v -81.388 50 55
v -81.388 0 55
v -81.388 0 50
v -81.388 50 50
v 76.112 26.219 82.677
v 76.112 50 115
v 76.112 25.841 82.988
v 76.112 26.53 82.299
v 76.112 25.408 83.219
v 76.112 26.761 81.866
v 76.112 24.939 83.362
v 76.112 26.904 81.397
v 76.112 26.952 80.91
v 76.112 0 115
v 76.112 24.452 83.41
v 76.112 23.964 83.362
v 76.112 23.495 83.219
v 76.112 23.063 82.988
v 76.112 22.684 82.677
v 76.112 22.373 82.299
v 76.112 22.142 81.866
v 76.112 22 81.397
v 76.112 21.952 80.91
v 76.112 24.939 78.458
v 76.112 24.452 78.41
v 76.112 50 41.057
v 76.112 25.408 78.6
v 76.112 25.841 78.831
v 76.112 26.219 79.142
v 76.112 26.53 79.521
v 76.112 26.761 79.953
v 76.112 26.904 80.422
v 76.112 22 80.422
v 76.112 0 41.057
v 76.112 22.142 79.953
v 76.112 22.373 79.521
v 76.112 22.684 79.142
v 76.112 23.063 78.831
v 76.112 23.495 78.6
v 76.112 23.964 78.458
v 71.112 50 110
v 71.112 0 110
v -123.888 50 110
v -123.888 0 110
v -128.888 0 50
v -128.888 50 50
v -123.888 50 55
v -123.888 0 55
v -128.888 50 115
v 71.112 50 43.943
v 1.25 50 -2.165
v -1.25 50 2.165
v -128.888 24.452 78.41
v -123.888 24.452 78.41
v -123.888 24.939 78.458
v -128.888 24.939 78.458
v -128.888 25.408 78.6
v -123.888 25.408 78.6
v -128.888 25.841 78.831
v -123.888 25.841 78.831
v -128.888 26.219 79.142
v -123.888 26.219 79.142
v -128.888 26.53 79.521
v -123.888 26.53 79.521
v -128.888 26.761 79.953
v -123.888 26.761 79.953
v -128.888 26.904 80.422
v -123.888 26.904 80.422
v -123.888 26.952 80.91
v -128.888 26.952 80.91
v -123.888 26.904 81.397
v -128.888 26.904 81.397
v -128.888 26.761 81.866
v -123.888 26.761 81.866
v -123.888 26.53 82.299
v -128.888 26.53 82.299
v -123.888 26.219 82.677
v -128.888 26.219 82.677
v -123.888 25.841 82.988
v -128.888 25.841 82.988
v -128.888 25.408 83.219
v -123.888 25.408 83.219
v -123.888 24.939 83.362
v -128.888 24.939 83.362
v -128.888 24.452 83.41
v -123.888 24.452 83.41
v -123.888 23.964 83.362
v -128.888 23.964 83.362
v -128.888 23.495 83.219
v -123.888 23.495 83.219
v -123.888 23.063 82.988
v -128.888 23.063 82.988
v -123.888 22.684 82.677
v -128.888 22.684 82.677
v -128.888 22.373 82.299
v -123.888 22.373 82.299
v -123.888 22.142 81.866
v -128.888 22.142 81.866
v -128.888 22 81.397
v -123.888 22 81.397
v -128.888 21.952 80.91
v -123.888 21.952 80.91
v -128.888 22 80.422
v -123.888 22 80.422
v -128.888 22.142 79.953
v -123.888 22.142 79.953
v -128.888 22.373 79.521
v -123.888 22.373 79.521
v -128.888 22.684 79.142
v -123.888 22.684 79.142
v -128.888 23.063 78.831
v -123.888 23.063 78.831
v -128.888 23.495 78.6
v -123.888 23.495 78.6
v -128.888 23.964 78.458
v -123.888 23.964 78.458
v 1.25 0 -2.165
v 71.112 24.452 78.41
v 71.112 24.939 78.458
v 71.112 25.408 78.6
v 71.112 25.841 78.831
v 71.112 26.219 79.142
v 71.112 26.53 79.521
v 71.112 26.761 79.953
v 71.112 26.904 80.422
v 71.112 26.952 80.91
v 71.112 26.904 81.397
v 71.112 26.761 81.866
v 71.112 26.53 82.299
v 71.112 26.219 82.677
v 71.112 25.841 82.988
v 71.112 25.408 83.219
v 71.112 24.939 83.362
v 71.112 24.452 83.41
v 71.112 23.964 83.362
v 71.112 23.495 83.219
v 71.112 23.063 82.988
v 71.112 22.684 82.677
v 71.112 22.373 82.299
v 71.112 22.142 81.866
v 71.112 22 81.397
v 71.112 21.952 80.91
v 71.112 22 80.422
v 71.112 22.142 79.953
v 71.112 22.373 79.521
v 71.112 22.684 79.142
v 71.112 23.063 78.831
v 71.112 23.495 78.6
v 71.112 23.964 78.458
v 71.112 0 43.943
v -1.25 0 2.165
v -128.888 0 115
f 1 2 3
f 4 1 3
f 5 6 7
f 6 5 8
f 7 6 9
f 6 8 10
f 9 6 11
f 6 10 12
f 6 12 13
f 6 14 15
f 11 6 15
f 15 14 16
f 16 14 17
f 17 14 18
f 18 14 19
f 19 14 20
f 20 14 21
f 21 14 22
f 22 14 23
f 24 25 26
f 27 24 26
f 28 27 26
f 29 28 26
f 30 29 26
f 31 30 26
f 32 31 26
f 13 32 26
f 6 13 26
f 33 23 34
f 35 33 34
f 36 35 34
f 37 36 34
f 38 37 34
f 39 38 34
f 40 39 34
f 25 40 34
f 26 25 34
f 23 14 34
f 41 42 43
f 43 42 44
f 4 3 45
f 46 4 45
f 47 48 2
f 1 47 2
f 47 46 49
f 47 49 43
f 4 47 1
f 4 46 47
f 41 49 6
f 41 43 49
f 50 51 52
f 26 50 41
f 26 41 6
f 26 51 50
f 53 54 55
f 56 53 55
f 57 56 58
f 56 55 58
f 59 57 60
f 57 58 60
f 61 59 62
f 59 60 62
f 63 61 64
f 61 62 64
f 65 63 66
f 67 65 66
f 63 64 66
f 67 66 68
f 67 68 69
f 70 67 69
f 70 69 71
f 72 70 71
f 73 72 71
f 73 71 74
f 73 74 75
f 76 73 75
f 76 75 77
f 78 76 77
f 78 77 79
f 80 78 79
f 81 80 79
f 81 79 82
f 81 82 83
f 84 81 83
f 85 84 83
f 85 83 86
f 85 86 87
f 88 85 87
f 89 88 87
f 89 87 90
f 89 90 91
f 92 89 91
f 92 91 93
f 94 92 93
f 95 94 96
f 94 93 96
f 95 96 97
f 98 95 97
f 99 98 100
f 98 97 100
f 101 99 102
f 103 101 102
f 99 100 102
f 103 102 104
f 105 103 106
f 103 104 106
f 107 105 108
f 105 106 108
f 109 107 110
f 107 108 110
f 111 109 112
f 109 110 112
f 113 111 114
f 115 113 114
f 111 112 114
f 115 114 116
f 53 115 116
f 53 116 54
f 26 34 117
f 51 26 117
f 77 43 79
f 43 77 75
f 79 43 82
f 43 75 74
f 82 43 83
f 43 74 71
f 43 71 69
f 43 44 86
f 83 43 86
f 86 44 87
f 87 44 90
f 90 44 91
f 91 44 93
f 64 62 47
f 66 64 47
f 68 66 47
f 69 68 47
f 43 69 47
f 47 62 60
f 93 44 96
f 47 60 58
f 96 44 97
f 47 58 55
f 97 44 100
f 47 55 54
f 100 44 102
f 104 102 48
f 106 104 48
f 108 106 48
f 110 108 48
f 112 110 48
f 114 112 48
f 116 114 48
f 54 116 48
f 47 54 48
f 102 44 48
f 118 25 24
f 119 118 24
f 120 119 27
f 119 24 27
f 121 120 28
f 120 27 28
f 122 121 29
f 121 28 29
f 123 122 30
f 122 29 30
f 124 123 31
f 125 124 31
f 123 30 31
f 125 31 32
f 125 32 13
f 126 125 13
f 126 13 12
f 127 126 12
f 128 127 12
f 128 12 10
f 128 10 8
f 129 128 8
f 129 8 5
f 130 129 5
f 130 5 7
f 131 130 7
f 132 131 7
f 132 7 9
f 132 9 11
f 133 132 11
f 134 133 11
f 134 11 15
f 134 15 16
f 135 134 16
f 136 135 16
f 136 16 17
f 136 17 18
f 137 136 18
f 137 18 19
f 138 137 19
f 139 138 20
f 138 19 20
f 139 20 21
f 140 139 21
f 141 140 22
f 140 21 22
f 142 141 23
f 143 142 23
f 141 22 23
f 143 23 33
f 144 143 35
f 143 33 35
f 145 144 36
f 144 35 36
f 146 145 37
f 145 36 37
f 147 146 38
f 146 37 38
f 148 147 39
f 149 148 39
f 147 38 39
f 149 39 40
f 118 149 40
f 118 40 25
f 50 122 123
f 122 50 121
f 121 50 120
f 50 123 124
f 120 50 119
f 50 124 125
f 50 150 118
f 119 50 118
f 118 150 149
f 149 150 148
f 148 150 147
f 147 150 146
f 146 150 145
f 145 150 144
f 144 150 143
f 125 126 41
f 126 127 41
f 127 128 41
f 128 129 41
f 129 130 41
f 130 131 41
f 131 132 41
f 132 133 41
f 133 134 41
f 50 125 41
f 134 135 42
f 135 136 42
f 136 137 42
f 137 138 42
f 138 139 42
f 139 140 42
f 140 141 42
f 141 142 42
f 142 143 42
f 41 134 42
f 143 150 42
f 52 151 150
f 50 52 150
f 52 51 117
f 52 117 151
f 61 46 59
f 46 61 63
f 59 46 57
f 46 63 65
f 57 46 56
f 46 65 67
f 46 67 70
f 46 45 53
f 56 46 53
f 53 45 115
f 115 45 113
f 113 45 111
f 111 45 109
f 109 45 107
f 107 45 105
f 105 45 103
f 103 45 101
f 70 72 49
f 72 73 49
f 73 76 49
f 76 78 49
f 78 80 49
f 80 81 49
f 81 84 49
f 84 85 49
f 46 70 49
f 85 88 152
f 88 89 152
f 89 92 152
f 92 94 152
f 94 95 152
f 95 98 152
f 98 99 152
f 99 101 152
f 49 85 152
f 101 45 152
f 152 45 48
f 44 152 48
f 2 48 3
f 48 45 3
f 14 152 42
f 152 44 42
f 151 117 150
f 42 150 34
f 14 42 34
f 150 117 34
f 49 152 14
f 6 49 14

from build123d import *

# Parameters (mm, degrees)
EXTRUDE_THIN1_DEPTH = 50
SKETCH4_R           = 2.5
CUT_EXTRUDE3_DEPTH  = 206


with BuildPart() as part:
    # Sketch3 → Extrude-Thin1 (new body)
    with BuildSketch(Plane(origin=(0, 0, 0), x_dir=(1, 0, 0), z_dir=(0, 1, 0))):
        Polygon((-1.25, -2.165063509), (71.112159322, -43.943375673), (71.112159322, -110), (-123.887840678, -110), (-123.887840678, -55), (-81.387840678, -55), (-81.387840678, -50), (-128.887840678, -50), (-128.887840678, -115), (76.112159322, -115), (76.112159322, -41.056624327), (1.25, 2.165063509), align=None)
    extrude(amount=EXTRUDE_THIN1_DEPTH)

    # Sketch4 → Cut-Extrude3 (cut, through all)
    with BuildSketch(Plane(origin=(76.112159322, 0, 0), x_dir=(0, 0, -1), z_dir=(1, 0, 0))):
        with Locations((-80.909677613, 24.451666954)):
            Circle(SKETCH4_R)
    extrude(amount=-CUT_EXTRUDE3_DEPTH, mode=Mode.SUBTRACT)


solid = part.part
